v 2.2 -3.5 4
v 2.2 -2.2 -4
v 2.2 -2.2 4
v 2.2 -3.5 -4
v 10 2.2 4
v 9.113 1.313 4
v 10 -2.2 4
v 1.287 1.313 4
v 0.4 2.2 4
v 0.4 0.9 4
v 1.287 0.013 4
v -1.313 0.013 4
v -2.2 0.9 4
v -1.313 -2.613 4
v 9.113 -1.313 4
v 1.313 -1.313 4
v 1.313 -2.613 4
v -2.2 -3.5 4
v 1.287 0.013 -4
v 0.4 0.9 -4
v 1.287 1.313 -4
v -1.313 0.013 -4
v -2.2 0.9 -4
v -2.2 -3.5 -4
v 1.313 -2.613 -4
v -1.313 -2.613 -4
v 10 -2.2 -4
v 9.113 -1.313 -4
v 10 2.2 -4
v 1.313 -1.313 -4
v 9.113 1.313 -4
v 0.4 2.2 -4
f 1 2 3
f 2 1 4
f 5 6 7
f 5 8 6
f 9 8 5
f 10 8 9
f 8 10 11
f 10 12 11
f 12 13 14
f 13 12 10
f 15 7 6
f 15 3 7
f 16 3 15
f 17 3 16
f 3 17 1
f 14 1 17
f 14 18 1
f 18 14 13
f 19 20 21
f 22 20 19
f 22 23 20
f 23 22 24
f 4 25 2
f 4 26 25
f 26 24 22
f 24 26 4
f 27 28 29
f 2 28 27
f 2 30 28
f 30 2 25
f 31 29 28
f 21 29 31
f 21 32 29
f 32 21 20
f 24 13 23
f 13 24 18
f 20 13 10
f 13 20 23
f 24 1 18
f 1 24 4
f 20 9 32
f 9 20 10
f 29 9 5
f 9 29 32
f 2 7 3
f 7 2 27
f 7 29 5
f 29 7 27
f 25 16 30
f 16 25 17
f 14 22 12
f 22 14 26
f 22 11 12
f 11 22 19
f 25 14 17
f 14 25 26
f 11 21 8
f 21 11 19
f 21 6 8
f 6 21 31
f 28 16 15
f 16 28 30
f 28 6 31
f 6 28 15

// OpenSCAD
outerWidth = 4.4;
cableEndWidth = 3.8;
plugWidth = 2.6;
height = 8;
cableEndHeight=0;
pins=[-1,0,0,0];

difference(){
        
    for (a = [ 0 : 1 : len(pins) - 1 ]){
        translate([a*plugWidth,pins[a]*0.5*plugWidth,-0.5*cableEndHeight]){
            cube([outerWidth, outerWidth, height], center=true);
            
            if(cableEndHeight > 0){
                translate([0,0,0.5*(height + cableEndHeight)]){
                       cube([cableEndWidth, cableEndWidth, cableEndHeight], center=true);
                }
            }
        }
    }

    for (a = [ 0 : 1 : len(pins) - 1 ]){
        translate([a*plugWidth,pins[a]*0.5*plugWidth,0]){
            cube([plugWidth*1.01, plugWidth*1.01, (height + cableEndHeight)*1.1], center=true);
        }
    }

}
